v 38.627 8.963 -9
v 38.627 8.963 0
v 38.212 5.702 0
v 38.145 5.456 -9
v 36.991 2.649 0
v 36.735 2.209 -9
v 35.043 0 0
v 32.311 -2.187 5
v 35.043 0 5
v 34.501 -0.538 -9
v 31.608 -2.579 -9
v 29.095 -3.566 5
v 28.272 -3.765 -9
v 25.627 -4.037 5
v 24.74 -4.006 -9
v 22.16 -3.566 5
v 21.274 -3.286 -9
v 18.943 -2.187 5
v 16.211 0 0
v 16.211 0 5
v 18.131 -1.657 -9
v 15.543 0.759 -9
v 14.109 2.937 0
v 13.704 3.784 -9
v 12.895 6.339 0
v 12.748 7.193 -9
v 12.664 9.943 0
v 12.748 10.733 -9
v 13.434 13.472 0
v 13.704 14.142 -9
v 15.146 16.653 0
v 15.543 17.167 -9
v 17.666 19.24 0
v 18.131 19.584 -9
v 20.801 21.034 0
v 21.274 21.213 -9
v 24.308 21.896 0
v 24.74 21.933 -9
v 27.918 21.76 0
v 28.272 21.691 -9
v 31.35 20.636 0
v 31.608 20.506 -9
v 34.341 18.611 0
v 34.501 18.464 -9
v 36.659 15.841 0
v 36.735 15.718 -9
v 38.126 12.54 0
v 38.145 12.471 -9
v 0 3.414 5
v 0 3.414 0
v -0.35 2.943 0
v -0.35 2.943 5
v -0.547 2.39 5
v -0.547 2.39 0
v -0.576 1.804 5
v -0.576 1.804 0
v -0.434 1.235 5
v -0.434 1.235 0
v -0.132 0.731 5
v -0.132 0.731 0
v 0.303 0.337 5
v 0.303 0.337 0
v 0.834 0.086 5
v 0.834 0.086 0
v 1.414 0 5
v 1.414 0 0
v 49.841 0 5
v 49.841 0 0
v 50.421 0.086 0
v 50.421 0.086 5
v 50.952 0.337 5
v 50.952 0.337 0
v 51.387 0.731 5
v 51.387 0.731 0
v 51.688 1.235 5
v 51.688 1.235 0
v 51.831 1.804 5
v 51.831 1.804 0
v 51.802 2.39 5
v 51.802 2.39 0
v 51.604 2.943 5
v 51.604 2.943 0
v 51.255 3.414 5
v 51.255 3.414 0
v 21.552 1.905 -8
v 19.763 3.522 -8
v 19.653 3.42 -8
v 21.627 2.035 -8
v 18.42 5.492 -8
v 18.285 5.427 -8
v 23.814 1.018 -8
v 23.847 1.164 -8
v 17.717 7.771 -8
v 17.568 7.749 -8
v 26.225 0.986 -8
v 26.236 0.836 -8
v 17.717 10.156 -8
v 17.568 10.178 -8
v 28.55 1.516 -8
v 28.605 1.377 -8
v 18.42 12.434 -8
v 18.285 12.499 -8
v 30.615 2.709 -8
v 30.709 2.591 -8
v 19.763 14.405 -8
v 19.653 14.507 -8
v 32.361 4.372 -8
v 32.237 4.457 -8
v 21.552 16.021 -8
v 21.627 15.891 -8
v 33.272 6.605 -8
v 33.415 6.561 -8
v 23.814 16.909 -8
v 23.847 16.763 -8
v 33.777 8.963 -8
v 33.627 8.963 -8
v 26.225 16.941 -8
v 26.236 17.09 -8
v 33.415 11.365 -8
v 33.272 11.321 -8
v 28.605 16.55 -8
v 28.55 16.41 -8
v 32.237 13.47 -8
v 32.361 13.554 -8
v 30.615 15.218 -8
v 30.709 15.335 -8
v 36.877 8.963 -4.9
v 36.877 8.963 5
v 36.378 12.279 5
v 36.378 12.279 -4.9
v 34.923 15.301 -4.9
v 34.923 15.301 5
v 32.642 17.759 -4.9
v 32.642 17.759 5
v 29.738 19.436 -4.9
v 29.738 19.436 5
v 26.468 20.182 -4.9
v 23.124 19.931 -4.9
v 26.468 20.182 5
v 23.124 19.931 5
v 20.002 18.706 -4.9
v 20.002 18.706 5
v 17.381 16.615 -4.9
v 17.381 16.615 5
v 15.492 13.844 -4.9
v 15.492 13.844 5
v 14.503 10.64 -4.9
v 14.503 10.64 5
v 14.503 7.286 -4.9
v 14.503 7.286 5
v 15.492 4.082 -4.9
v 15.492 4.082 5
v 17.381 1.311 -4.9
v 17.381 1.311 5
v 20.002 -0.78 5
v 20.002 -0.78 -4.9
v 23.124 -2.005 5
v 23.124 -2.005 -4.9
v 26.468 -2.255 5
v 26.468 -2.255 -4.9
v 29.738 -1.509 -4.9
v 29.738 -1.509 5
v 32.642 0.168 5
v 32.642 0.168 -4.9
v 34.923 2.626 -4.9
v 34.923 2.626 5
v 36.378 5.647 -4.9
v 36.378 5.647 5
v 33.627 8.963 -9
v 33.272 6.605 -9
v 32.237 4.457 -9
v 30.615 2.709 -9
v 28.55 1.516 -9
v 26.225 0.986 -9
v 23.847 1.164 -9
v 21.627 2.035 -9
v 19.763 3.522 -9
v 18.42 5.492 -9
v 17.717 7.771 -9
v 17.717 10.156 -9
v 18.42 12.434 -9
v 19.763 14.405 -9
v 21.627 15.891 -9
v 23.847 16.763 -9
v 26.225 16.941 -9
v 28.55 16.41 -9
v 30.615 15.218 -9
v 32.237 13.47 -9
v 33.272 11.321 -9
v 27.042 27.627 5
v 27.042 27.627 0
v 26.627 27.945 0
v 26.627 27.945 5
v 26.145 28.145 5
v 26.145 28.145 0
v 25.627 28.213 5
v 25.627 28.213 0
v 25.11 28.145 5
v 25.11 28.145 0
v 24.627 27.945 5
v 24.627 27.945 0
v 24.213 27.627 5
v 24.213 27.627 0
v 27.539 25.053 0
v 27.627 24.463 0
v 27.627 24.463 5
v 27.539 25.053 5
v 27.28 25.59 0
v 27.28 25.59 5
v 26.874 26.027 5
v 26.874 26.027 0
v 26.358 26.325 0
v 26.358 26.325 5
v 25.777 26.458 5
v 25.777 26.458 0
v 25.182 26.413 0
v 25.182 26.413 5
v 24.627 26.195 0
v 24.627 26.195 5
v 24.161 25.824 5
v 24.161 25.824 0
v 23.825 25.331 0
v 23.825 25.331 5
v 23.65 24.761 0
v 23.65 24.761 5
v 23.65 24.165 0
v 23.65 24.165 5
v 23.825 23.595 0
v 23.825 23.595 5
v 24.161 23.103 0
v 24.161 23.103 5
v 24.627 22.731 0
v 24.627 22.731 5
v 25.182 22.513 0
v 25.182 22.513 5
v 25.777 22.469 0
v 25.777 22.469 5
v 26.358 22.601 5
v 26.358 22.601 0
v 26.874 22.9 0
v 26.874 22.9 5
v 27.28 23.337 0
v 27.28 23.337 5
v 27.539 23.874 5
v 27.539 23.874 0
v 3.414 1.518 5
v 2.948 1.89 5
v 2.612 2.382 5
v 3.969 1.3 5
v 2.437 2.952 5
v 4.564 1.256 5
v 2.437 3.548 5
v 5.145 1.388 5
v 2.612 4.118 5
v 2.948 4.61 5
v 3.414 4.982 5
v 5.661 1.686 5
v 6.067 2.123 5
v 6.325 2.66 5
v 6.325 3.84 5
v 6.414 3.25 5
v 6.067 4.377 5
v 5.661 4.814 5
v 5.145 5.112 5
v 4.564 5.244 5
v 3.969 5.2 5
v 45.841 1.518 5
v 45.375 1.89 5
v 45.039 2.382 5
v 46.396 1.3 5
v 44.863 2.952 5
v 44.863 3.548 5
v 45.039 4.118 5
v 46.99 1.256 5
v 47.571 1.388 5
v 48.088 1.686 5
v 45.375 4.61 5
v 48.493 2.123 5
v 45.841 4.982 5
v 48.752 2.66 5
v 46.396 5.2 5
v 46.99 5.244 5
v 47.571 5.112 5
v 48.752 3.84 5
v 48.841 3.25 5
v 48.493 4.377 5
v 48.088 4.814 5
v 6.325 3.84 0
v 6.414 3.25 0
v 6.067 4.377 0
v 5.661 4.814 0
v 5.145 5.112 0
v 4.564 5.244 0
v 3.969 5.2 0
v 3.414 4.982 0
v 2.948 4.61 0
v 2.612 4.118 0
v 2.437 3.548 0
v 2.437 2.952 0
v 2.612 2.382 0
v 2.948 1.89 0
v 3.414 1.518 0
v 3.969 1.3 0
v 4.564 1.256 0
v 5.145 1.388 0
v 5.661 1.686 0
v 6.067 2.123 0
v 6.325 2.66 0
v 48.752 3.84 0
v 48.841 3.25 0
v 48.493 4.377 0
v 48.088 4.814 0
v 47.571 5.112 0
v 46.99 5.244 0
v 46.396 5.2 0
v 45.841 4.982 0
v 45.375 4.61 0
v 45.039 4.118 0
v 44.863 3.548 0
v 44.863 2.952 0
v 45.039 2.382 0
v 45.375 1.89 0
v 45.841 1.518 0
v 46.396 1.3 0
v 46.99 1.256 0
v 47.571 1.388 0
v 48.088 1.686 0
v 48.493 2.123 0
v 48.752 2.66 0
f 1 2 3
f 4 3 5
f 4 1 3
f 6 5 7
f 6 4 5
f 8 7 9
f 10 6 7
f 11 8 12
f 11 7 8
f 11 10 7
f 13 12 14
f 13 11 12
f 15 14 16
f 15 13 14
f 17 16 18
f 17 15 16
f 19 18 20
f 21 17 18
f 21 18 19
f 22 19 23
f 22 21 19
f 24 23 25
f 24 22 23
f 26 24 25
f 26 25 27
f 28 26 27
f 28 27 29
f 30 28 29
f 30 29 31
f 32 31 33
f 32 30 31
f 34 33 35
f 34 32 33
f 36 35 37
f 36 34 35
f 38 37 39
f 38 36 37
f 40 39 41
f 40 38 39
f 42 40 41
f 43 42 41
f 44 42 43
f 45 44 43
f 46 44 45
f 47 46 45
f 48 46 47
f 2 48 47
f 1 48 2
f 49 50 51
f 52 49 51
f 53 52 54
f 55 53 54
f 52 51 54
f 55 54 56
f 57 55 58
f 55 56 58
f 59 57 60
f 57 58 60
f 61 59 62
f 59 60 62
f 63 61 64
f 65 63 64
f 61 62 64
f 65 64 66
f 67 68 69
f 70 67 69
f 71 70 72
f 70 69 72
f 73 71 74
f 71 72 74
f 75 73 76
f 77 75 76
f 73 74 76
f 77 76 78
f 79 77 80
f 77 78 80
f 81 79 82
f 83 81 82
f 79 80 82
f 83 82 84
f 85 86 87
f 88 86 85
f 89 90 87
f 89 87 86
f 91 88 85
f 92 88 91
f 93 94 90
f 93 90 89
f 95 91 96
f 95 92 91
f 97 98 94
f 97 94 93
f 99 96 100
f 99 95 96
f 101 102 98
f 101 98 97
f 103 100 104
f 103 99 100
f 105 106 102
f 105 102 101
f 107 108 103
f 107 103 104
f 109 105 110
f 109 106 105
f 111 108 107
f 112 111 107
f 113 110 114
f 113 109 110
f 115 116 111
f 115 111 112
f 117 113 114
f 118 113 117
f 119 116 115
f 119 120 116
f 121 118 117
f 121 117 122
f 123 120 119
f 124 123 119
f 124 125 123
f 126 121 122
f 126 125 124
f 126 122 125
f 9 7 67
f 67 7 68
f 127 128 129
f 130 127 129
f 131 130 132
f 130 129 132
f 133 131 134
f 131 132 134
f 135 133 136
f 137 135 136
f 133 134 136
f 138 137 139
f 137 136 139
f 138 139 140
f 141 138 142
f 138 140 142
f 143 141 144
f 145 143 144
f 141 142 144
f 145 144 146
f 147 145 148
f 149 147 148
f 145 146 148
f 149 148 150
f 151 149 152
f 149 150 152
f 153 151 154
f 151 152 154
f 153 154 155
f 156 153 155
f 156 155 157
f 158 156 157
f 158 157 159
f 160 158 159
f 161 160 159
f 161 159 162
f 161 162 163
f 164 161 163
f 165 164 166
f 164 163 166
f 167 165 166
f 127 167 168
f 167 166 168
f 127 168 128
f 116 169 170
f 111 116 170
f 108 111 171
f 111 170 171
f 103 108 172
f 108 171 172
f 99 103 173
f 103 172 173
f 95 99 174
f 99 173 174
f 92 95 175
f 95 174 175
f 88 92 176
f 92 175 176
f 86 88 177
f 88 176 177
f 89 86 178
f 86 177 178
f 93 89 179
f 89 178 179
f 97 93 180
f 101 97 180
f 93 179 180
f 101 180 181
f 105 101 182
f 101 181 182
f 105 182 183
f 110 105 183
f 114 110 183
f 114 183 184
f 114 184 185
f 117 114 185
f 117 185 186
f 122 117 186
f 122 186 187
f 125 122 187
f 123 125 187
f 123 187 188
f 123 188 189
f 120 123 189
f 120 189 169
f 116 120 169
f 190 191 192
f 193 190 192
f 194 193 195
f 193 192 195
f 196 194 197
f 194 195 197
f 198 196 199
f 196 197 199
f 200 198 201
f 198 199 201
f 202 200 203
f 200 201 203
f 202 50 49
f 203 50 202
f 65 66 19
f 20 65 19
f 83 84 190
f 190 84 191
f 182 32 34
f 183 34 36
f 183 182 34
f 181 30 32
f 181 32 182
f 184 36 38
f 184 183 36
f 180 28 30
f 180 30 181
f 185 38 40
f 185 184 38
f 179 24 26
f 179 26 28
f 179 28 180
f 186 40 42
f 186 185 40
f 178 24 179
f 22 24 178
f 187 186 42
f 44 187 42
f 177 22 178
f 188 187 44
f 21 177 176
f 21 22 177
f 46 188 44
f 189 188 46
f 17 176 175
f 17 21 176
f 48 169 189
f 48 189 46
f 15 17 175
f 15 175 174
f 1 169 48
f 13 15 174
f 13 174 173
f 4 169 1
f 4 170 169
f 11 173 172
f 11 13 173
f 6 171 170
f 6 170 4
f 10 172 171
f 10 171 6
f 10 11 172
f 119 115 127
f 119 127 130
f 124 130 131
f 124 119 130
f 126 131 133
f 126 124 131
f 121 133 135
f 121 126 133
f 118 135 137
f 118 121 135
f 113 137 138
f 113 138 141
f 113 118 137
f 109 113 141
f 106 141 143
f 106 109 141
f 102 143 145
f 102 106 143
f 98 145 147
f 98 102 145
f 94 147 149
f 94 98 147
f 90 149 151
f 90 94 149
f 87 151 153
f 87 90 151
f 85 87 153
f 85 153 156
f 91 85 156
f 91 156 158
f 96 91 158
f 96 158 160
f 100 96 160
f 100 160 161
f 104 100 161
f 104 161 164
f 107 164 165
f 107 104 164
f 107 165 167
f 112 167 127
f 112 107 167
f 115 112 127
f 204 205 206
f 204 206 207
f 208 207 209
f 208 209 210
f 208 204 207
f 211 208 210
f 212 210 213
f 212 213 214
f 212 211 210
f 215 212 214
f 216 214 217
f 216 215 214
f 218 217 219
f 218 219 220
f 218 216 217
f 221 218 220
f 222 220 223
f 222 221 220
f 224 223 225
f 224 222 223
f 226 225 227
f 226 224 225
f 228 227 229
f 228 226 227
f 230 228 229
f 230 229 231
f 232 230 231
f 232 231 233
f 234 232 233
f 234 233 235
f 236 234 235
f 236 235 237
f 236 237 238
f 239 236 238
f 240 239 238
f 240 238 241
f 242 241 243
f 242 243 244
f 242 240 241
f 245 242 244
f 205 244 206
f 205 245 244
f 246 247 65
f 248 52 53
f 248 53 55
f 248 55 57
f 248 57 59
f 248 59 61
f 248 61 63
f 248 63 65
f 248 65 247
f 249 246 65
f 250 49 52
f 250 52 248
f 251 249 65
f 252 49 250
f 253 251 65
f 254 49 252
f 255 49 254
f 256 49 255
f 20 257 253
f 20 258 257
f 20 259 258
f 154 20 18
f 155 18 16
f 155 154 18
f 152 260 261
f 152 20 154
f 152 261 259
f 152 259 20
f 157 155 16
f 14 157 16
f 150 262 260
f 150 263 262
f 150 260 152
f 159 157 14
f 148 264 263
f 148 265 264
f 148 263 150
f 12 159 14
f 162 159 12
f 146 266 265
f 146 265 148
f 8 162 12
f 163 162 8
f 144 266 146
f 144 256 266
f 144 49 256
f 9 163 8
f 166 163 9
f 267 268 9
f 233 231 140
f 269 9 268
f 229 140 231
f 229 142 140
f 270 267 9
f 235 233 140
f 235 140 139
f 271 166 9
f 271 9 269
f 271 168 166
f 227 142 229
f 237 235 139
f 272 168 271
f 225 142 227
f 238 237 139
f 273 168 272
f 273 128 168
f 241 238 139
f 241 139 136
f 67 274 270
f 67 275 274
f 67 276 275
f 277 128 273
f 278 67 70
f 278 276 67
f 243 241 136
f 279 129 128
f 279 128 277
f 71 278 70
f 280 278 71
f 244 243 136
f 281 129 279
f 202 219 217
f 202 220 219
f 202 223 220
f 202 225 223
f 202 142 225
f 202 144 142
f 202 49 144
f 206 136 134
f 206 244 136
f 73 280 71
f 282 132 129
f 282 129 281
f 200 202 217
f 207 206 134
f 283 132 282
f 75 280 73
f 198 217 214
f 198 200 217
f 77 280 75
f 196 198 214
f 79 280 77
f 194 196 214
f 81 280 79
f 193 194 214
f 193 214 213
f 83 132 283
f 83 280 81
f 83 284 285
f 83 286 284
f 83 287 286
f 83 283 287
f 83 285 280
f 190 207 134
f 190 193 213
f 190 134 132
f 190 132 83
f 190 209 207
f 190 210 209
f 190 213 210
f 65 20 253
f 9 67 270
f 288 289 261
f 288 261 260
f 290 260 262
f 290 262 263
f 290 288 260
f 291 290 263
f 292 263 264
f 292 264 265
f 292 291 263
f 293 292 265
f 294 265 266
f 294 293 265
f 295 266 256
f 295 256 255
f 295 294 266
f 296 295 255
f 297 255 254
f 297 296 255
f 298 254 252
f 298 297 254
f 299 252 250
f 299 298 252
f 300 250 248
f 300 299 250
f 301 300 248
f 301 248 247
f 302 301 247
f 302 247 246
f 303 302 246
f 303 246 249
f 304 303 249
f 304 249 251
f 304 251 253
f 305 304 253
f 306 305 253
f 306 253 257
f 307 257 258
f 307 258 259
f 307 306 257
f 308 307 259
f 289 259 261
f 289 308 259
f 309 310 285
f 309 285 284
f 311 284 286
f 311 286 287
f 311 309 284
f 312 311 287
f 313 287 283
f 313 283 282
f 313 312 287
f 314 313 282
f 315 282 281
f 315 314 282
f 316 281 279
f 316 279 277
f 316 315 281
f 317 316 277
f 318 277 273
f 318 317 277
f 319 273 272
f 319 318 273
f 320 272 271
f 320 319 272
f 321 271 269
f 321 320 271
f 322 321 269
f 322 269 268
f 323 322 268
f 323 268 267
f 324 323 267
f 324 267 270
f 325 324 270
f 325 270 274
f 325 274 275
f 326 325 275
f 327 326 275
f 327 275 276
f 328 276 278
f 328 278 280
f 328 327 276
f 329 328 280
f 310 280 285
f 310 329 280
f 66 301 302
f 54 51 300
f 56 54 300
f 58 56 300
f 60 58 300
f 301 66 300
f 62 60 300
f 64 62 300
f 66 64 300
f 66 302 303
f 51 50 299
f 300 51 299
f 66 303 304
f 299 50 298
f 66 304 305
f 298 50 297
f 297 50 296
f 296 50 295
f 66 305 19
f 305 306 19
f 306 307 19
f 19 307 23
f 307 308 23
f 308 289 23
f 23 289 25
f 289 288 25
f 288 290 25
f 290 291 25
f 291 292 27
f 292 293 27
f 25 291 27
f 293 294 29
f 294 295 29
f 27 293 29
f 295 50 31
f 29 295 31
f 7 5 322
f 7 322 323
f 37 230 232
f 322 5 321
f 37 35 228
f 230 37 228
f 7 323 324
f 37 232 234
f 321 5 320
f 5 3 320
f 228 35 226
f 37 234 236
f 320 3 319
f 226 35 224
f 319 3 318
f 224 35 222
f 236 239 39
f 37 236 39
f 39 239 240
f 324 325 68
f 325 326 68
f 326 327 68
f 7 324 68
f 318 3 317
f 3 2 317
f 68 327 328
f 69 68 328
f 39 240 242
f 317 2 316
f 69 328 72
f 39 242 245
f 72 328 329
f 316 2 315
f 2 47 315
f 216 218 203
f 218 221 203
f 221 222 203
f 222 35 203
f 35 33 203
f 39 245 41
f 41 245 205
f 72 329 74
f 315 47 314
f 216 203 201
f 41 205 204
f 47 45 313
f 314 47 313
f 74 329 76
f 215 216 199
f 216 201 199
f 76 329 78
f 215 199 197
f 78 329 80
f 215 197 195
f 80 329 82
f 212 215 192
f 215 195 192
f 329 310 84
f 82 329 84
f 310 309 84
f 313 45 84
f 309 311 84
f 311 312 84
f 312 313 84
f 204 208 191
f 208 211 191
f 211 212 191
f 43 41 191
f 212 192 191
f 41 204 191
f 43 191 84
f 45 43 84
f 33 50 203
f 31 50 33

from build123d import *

# Parameters (mm, degrees)
SKETCH_R        = 2
PAD_DEPTH       = 5
SKETCH001_R     = 13
PAD001_DEPTH    = 9
SKETCH002_R     = 8
POCKET_DEPTH    = 18.001
SKETCH003_W     = 37.242641
SKETCH003_H     = 5
POCKET001_DEPTH = 41.926514
SKETCH004_R     = 11.25
POCKET002_DEPTH = 13
CHAMFER_SIZE    = 3.1


with BuildPart() as part:
    # Sketch → Pad (new body)
    with BuildSketch(Plane.XY):
        with BuildLine():
            Line((1.414214, 0), (49.84062, 0))
            ThreePointArc((49.84062, 0), (51.688379, 1.234633), (51.254834, 3.414214))
            Line((51.254834, 3.414214), (27.041631, 27.627417))
            ThreePointArc((27.041631, 27.627417), (25.627417, 28.213203), (24.213203, 27.627417))
            Line((0, 3.414214), (24.213203, 27.627417))
            ThreePointArc((0, 3.414214), (-0.433546, 1.234633), (1.414214, 0))
        make_face()
        with Locations((4.414214, 3.25)):
            Circle(SKETCH_R, mode=Mode.SUBTRACT)
        with Locations((46.84062, 3.25)):
            Circle(SKETCH_R, mode=Mode.SUBTRACT)
        with Locations((25.627417, 24.463203)):
            Circle(SKETCH_R, mode=Mode.SUBTRACT)
    extrude(amount=PAD_DEPTH)

    # Sketch001 (on Face10 of Pad) → Pad001 (join, symmetric)
    with BuildSketch(Plane(origin=(0, 0, 0), x_dir=(1, 0, 0), z_dir=(0, 0, -1))):
        with Locations((25.627417, -8.963203)):
            Circle(SKETCH001_R)
    extrude(amount=PAD001_DEPTH, both=True)

    # Sketch002 (on Face15 of Pad001) → Pocket (cut, through all)
    with BuildSketch(Plane(origin=(0, 0, -9), x_dir=(1, 0, 0), z_dir=(0, 0, -1))):
        with Locations((25.627417, -8.963203)):
            Circle(SKETCH002_R)
    extrude(amount=-POCKET_DEPTH, mode=Mode.SUBTRACT)

    # Sketch003 (on Face8 of Pocket) → Pocket001 (cut, through all)
    with BuildSketch(Plane(origin=(27.334524, 27.334524, 0), x_dir=(-0.707107, 0.707107, 0), z_dir=(0.707107, 0.707107, 0))):
        with Locations((-15.207106, 7.5)):
            Rectangle(SKETCH003_W, SKETCH003_H)
    extrude(amount=-POCKET001_DEPTH, mode=Mode.SUBTRACT)

    # Sketch004 (on Face15 of Pocket001) → Pocket002 (cut)
    with BuildSketch(Plane.XY.offset(5)):
        with Locations((25.627417, 8.963203)):
            Circle(SKETCH004_R)
    extrude(amount=-POCKET002_DEPTH, mode=Mode.SUBTRACT)

    # Chamfer
    chamfer_edges = [part.edges().sort_by_distance(p)[0] for p in [
        (14.377417, 8.963203, -8),
    ]]
    chamfer(chamfer_edges, length=CHAMFER_SIZE)


solid = part.part
